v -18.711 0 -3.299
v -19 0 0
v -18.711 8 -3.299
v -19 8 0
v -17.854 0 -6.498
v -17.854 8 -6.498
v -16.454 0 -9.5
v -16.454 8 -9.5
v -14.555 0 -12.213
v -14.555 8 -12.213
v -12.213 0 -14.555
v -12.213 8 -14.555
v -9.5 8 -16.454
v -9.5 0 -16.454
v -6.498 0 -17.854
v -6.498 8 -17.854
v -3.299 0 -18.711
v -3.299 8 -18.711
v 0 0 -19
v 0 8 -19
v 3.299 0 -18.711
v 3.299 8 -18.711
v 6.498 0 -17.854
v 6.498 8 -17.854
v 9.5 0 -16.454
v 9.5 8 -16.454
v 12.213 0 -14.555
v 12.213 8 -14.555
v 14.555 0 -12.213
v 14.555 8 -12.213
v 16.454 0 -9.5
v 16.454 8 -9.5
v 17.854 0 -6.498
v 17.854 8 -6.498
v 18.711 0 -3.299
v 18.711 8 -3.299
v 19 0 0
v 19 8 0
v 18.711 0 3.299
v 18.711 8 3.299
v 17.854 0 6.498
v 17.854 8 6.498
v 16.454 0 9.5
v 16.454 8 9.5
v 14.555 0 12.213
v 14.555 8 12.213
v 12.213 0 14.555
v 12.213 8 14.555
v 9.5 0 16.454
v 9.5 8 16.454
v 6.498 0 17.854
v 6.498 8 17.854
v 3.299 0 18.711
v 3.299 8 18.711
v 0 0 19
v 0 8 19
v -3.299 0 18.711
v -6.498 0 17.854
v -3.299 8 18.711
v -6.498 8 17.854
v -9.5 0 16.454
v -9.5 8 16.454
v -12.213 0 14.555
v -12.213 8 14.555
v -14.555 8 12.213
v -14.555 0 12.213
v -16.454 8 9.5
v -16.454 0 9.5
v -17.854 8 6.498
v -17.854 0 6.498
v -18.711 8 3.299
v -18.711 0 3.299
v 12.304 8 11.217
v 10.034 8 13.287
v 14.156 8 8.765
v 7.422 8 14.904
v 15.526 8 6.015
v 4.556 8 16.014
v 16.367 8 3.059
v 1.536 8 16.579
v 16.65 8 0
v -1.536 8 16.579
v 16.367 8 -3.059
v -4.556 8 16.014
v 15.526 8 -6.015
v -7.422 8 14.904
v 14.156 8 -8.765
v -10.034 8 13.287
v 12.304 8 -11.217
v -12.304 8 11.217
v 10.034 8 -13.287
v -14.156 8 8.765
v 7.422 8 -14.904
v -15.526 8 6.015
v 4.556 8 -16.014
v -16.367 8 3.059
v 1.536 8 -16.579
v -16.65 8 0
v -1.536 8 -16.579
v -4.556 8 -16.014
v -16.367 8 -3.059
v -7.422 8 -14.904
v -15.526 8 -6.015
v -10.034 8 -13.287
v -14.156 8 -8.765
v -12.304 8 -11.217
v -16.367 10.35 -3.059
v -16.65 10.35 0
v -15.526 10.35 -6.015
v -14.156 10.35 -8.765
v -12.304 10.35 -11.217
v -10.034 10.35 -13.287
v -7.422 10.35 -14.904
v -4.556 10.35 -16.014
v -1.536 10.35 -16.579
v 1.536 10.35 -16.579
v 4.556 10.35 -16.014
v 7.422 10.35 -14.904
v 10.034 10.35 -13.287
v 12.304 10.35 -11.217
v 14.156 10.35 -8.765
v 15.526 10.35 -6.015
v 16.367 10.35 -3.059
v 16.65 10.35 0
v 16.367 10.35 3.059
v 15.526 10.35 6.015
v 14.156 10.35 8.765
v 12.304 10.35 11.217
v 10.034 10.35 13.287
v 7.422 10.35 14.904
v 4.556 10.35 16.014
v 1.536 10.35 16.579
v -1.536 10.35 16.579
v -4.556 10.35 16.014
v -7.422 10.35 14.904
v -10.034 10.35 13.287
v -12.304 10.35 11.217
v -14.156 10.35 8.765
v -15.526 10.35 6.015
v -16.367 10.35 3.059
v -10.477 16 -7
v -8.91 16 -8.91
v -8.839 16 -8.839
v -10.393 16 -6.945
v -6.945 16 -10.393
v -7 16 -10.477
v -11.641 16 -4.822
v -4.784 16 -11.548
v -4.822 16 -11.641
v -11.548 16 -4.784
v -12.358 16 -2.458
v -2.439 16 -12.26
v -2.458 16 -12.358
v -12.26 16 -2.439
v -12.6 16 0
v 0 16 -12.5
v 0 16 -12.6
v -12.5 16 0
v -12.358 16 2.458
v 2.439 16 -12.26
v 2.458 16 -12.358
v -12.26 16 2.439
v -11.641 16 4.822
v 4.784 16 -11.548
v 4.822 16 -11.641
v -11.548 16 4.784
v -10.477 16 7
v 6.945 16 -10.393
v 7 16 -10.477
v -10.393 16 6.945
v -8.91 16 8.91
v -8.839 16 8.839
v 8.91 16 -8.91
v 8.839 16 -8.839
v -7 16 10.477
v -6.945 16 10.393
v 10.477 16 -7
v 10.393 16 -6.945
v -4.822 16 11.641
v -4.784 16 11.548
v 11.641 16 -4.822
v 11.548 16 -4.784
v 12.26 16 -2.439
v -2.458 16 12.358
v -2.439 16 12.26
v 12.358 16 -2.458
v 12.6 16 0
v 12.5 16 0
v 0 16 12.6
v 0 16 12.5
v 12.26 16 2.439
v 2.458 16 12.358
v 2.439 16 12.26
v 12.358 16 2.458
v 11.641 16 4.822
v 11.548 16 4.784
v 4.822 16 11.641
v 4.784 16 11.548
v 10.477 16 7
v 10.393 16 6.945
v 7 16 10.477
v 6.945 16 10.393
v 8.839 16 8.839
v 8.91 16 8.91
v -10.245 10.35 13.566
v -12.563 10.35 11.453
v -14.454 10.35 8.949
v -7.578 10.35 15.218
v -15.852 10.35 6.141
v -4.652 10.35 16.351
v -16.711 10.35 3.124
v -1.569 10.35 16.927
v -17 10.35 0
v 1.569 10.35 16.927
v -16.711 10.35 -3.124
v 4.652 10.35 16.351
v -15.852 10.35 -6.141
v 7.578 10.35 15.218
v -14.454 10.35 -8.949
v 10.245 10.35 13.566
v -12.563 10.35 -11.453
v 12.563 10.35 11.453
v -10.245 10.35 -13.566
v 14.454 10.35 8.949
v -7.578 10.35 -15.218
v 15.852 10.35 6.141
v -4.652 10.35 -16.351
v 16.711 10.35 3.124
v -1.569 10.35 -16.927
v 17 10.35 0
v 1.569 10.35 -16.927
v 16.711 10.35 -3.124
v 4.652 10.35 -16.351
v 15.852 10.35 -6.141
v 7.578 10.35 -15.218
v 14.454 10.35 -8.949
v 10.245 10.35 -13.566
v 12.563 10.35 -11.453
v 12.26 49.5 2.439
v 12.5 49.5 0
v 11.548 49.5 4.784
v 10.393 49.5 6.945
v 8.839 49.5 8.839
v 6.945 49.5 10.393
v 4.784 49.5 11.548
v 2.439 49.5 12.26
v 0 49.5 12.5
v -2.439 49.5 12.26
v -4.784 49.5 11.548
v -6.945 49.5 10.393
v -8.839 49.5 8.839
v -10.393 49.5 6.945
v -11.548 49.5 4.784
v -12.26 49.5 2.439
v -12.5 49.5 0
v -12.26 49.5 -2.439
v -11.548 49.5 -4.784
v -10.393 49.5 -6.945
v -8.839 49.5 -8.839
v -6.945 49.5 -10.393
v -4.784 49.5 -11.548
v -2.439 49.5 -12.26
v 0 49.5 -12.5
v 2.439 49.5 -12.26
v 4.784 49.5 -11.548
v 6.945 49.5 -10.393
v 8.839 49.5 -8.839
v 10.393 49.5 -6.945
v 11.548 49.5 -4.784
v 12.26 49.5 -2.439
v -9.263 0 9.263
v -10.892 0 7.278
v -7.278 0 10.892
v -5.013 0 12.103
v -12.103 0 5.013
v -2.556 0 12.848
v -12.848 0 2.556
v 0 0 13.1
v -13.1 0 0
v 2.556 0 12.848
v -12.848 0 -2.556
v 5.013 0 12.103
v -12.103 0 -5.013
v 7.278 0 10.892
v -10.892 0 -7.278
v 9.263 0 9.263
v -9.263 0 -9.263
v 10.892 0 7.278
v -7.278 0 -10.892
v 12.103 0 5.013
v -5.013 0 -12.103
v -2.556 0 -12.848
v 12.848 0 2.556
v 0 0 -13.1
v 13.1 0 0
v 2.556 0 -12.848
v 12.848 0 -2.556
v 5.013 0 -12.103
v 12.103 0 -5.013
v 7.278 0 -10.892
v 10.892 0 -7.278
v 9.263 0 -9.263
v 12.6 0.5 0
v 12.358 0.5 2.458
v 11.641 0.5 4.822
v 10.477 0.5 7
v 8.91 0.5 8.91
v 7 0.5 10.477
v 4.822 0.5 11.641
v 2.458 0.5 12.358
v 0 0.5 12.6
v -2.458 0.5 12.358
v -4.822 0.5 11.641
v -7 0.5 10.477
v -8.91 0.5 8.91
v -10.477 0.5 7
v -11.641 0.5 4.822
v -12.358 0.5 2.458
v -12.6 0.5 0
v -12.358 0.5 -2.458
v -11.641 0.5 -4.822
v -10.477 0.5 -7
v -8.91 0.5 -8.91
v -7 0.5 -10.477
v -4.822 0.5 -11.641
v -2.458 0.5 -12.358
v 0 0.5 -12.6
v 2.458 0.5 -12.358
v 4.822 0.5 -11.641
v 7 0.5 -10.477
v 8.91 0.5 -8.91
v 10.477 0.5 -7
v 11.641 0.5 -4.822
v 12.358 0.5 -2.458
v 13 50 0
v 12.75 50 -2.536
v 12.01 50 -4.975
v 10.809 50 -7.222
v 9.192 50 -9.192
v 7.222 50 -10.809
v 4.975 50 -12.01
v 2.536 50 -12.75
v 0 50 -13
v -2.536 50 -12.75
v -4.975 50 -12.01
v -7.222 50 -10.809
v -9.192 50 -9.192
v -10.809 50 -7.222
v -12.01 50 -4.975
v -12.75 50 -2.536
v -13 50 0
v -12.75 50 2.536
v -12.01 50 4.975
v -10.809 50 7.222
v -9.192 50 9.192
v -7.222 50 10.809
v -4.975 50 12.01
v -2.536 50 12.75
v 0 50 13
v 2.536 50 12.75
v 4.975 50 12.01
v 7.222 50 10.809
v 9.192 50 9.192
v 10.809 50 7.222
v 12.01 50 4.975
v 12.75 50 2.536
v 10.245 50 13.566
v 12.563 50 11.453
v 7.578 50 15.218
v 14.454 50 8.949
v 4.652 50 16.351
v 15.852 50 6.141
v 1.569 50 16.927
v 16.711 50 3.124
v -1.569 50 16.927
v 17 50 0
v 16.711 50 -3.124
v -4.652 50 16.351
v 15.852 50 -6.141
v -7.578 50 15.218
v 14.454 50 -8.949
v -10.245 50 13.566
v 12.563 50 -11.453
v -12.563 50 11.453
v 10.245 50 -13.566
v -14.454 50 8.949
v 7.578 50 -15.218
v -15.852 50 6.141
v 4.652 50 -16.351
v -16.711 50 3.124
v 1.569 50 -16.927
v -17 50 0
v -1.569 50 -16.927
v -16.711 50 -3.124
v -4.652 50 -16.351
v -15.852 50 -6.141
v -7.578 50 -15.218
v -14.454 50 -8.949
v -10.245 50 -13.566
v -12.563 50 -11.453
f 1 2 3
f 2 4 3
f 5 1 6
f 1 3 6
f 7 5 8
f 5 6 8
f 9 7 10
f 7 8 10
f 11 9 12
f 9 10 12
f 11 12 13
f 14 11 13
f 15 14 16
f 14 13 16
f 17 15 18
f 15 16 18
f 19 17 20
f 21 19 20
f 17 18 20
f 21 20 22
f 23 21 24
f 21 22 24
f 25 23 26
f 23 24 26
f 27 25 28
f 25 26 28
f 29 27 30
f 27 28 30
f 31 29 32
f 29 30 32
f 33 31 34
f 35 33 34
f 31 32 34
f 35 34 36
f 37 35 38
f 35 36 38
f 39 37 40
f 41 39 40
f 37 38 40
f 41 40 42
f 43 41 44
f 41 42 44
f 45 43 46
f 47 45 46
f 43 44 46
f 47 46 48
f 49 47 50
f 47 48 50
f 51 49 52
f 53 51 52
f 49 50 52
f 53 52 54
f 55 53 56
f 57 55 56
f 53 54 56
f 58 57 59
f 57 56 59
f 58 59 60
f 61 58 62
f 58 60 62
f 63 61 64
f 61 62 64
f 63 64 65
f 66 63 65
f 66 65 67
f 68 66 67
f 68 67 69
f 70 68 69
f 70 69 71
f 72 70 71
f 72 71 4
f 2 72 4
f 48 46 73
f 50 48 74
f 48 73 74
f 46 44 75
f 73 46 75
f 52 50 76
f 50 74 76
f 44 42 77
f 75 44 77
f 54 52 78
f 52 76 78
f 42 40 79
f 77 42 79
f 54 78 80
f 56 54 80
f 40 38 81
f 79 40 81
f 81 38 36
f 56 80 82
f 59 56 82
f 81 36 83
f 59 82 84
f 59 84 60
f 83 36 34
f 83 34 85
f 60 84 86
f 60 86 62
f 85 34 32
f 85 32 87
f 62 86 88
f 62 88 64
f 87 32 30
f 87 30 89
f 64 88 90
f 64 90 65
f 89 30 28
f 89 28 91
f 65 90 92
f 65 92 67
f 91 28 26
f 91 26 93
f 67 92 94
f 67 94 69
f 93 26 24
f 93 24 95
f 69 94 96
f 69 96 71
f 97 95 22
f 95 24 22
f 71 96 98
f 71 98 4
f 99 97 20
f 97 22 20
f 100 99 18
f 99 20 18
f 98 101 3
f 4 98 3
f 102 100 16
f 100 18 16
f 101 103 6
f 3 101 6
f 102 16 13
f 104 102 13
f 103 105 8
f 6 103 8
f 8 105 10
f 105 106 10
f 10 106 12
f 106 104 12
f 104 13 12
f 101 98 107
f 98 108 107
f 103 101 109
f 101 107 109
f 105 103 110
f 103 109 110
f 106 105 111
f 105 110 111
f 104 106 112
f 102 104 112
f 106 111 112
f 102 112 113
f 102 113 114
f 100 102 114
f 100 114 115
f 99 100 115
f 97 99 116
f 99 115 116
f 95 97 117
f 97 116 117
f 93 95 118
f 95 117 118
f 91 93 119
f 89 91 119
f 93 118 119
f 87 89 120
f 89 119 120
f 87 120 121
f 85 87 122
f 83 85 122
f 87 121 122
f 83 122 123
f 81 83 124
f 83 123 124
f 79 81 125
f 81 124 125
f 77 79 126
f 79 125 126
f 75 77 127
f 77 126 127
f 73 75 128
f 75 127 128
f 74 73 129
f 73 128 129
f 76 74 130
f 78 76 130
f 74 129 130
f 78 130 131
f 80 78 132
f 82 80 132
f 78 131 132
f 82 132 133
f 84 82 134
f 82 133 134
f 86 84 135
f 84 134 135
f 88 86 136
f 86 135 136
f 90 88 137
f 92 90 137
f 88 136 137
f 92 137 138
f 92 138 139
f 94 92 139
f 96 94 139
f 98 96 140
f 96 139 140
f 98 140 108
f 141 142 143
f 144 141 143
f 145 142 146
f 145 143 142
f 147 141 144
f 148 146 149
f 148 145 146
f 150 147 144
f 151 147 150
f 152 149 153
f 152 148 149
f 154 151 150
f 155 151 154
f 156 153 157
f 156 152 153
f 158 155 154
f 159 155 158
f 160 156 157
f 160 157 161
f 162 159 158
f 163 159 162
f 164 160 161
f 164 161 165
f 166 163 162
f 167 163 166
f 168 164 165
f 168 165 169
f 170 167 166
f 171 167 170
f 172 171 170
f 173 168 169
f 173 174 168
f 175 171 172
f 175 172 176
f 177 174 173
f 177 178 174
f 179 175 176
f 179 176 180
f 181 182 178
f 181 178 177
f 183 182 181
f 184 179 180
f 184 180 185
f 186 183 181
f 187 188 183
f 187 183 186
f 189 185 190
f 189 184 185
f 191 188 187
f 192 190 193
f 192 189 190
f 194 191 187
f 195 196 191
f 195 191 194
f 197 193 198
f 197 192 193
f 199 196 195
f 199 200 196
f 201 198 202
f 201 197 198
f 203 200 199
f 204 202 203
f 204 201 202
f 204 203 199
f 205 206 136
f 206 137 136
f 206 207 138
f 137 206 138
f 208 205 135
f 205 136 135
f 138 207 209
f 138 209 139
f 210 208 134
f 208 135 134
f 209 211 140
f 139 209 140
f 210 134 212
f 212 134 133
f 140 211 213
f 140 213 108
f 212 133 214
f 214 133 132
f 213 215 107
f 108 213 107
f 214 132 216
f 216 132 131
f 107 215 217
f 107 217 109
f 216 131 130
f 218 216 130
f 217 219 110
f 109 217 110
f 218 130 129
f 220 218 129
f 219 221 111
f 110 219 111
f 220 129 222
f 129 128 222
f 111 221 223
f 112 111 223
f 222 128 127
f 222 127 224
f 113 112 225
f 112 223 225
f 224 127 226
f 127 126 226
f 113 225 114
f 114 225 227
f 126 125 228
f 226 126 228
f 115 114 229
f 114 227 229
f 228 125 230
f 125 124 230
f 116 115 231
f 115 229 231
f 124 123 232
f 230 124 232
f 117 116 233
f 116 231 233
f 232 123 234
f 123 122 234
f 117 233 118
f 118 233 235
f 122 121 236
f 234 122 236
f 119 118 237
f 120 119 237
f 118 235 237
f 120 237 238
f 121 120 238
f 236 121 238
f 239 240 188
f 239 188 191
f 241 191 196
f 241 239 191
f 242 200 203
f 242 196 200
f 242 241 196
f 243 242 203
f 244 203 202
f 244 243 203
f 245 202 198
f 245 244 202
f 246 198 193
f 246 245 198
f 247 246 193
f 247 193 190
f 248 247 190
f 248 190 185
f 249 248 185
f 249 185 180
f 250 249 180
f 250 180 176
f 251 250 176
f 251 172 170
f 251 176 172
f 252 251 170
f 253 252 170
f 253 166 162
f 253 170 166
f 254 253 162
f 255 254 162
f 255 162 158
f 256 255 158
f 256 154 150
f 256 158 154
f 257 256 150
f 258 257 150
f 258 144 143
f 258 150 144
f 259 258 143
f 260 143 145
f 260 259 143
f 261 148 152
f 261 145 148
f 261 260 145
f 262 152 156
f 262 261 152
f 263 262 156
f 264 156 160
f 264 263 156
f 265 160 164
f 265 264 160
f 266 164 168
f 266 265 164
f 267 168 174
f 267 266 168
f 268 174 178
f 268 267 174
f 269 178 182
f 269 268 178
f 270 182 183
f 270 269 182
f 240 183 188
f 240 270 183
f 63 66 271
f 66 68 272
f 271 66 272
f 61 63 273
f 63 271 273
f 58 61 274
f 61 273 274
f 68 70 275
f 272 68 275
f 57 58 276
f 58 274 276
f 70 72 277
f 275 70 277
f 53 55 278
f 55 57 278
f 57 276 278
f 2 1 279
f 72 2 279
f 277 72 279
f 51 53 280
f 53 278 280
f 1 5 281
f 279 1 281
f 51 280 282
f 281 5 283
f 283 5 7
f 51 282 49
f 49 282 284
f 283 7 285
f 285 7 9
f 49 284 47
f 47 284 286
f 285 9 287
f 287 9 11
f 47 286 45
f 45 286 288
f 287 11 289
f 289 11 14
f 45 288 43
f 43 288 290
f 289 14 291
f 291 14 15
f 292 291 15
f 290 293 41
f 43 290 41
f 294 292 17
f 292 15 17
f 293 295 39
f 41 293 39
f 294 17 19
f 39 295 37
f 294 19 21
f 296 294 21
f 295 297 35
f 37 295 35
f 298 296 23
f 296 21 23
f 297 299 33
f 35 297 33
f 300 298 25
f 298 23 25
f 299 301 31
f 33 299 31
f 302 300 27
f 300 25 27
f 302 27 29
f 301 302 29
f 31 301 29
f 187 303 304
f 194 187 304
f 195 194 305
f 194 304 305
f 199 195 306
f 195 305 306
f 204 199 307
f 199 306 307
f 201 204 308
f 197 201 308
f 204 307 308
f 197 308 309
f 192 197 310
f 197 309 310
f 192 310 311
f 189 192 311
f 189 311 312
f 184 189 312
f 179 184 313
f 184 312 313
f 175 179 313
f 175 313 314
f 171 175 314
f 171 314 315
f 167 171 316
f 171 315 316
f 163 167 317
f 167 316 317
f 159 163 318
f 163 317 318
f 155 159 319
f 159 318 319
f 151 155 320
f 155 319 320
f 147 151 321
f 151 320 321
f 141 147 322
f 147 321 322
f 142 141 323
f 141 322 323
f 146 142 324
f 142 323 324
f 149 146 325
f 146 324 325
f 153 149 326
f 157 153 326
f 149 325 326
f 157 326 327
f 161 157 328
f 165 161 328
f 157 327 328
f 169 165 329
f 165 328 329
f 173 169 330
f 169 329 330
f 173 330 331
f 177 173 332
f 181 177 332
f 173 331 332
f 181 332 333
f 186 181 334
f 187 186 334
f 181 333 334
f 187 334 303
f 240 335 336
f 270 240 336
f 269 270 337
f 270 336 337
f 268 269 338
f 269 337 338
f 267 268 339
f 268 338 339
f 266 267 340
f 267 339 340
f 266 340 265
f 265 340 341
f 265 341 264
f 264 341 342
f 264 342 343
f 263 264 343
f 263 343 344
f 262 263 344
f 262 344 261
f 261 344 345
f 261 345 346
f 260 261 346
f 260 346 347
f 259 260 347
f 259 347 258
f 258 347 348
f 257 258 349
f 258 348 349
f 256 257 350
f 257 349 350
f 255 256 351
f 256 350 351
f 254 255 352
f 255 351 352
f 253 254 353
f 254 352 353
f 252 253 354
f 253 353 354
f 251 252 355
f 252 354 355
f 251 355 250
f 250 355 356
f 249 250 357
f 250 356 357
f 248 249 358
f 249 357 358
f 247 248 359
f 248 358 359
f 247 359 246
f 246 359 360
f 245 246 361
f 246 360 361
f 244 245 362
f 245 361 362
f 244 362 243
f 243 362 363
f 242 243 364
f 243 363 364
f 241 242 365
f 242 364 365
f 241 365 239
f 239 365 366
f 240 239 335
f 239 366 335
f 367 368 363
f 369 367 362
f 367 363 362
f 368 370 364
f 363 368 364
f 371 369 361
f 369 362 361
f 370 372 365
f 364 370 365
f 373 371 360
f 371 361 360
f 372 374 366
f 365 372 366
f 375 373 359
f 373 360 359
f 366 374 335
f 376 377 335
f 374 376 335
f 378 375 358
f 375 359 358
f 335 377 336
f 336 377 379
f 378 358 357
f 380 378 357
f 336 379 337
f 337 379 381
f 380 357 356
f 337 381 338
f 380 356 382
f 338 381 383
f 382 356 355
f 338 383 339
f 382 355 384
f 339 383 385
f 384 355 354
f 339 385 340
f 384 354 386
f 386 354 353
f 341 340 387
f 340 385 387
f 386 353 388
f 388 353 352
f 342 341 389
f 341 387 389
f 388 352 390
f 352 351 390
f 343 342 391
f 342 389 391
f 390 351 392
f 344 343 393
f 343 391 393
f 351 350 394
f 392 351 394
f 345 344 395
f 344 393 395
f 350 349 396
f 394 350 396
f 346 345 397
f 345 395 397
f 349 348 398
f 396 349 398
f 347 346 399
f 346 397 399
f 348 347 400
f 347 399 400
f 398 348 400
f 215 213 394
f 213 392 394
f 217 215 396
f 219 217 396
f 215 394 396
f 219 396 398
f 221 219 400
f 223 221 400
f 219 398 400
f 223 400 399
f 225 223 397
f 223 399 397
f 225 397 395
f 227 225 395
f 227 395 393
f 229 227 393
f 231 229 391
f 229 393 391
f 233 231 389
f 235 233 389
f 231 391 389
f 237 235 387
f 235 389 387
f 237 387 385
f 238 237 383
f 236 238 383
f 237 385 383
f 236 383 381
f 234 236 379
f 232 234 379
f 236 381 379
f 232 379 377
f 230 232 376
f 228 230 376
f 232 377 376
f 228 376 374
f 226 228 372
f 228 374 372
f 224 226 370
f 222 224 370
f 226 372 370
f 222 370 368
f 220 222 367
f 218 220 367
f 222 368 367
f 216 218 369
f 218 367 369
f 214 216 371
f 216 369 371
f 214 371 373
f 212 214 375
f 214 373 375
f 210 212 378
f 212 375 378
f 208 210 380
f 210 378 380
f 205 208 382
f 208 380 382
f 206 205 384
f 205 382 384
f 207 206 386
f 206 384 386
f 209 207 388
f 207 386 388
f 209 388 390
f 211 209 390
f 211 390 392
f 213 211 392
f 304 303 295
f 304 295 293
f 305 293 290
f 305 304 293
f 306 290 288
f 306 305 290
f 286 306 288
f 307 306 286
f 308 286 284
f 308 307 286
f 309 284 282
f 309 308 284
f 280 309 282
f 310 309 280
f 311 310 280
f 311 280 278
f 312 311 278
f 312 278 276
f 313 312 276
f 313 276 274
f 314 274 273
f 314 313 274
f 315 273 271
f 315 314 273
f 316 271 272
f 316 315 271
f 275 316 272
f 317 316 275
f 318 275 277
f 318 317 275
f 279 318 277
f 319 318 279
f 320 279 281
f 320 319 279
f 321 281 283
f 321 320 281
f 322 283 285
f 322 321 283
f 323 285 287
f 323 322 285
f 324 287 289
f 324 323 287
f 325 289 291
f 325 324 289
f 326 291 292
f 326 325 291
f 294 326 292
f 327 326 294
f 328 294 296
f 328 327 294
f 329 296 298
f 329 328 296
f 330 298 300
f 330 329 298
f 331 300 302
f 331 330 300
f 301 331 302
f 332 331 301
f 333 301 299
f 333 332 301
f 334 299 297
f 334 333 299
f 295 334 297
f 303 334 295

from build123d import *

# Parameters (mm, degrees)
CUT_EXTRUDE1_DEPTH      = 57.762663785
CUT_EXTRUDE1_DEPTH_BACK = 57.762663785
SKETCH2_R               = 12.5
SKETCH4_R               = 12.6
CUT_EXTRUDE2_DEPTH      = 16
CHAMFER4_SIZE           = 0.5
CHAMFER5_SIZE           = 0.5


with BuildPart() as part:
    # Sketch1 → Revolve1 (revolve)
    with BuildSketch(Plane.XY, mode=Mode.PRIVATE) as revolve1_sk:
        Polygon((0, 0), (19, 0), (19, 8), (16.65, 8), (16.65, 10.35), (17, 10.35), (17, 50), (0, 50), align=None)
    revolve(revolve1_sk.sketch.rotate(Axis((0, 50, 0), (0, -1, 0)), 180), axis=Axis((0, 50, 0), (0, -1, 0)))

    # Sketch2 → Cut-Extrude1 (cut, two sides: drawn at the far end of the back side and taken through both)
    with BuildSketch(Plane.XZ.offset(-CUT_EXTRUDE1_DEPTH_BACK)):
        Circle(SKETCH2_R)
    extrude(amount=CUT_EXTRUDE1_DEPTH + CUT_EXTRUDE1_DEPTH_BACK, mode=Mode.SUBTRACT)

    # Sketch4 → Cut-Extrude2 (cut)
    with BuildSketch(Plane.XZ):
        Circle(SKETCH4_R)
    extrude(amount=-CUT_EXTRUDE2_DEPTH, mode=Mode.SUBTRACT)

    # Chamfer4
    chamfer4_edges = [part.edges().sort_by_distance(p)[0] for p in [
        (-12.6, 0, 0),
    ]]
    chamfer(chamfer4_edges, length=CHAMFER4_SIZE)

    # Chamfer5
    chamfer5_edges = [part.edges().sort_by_distance(p)[0] for p in [
        (-12.5, 50, 0),
    ]]
    chamfer(chamfer5_edges, length=CHAMFER5_SIZE)


solid = part.part
